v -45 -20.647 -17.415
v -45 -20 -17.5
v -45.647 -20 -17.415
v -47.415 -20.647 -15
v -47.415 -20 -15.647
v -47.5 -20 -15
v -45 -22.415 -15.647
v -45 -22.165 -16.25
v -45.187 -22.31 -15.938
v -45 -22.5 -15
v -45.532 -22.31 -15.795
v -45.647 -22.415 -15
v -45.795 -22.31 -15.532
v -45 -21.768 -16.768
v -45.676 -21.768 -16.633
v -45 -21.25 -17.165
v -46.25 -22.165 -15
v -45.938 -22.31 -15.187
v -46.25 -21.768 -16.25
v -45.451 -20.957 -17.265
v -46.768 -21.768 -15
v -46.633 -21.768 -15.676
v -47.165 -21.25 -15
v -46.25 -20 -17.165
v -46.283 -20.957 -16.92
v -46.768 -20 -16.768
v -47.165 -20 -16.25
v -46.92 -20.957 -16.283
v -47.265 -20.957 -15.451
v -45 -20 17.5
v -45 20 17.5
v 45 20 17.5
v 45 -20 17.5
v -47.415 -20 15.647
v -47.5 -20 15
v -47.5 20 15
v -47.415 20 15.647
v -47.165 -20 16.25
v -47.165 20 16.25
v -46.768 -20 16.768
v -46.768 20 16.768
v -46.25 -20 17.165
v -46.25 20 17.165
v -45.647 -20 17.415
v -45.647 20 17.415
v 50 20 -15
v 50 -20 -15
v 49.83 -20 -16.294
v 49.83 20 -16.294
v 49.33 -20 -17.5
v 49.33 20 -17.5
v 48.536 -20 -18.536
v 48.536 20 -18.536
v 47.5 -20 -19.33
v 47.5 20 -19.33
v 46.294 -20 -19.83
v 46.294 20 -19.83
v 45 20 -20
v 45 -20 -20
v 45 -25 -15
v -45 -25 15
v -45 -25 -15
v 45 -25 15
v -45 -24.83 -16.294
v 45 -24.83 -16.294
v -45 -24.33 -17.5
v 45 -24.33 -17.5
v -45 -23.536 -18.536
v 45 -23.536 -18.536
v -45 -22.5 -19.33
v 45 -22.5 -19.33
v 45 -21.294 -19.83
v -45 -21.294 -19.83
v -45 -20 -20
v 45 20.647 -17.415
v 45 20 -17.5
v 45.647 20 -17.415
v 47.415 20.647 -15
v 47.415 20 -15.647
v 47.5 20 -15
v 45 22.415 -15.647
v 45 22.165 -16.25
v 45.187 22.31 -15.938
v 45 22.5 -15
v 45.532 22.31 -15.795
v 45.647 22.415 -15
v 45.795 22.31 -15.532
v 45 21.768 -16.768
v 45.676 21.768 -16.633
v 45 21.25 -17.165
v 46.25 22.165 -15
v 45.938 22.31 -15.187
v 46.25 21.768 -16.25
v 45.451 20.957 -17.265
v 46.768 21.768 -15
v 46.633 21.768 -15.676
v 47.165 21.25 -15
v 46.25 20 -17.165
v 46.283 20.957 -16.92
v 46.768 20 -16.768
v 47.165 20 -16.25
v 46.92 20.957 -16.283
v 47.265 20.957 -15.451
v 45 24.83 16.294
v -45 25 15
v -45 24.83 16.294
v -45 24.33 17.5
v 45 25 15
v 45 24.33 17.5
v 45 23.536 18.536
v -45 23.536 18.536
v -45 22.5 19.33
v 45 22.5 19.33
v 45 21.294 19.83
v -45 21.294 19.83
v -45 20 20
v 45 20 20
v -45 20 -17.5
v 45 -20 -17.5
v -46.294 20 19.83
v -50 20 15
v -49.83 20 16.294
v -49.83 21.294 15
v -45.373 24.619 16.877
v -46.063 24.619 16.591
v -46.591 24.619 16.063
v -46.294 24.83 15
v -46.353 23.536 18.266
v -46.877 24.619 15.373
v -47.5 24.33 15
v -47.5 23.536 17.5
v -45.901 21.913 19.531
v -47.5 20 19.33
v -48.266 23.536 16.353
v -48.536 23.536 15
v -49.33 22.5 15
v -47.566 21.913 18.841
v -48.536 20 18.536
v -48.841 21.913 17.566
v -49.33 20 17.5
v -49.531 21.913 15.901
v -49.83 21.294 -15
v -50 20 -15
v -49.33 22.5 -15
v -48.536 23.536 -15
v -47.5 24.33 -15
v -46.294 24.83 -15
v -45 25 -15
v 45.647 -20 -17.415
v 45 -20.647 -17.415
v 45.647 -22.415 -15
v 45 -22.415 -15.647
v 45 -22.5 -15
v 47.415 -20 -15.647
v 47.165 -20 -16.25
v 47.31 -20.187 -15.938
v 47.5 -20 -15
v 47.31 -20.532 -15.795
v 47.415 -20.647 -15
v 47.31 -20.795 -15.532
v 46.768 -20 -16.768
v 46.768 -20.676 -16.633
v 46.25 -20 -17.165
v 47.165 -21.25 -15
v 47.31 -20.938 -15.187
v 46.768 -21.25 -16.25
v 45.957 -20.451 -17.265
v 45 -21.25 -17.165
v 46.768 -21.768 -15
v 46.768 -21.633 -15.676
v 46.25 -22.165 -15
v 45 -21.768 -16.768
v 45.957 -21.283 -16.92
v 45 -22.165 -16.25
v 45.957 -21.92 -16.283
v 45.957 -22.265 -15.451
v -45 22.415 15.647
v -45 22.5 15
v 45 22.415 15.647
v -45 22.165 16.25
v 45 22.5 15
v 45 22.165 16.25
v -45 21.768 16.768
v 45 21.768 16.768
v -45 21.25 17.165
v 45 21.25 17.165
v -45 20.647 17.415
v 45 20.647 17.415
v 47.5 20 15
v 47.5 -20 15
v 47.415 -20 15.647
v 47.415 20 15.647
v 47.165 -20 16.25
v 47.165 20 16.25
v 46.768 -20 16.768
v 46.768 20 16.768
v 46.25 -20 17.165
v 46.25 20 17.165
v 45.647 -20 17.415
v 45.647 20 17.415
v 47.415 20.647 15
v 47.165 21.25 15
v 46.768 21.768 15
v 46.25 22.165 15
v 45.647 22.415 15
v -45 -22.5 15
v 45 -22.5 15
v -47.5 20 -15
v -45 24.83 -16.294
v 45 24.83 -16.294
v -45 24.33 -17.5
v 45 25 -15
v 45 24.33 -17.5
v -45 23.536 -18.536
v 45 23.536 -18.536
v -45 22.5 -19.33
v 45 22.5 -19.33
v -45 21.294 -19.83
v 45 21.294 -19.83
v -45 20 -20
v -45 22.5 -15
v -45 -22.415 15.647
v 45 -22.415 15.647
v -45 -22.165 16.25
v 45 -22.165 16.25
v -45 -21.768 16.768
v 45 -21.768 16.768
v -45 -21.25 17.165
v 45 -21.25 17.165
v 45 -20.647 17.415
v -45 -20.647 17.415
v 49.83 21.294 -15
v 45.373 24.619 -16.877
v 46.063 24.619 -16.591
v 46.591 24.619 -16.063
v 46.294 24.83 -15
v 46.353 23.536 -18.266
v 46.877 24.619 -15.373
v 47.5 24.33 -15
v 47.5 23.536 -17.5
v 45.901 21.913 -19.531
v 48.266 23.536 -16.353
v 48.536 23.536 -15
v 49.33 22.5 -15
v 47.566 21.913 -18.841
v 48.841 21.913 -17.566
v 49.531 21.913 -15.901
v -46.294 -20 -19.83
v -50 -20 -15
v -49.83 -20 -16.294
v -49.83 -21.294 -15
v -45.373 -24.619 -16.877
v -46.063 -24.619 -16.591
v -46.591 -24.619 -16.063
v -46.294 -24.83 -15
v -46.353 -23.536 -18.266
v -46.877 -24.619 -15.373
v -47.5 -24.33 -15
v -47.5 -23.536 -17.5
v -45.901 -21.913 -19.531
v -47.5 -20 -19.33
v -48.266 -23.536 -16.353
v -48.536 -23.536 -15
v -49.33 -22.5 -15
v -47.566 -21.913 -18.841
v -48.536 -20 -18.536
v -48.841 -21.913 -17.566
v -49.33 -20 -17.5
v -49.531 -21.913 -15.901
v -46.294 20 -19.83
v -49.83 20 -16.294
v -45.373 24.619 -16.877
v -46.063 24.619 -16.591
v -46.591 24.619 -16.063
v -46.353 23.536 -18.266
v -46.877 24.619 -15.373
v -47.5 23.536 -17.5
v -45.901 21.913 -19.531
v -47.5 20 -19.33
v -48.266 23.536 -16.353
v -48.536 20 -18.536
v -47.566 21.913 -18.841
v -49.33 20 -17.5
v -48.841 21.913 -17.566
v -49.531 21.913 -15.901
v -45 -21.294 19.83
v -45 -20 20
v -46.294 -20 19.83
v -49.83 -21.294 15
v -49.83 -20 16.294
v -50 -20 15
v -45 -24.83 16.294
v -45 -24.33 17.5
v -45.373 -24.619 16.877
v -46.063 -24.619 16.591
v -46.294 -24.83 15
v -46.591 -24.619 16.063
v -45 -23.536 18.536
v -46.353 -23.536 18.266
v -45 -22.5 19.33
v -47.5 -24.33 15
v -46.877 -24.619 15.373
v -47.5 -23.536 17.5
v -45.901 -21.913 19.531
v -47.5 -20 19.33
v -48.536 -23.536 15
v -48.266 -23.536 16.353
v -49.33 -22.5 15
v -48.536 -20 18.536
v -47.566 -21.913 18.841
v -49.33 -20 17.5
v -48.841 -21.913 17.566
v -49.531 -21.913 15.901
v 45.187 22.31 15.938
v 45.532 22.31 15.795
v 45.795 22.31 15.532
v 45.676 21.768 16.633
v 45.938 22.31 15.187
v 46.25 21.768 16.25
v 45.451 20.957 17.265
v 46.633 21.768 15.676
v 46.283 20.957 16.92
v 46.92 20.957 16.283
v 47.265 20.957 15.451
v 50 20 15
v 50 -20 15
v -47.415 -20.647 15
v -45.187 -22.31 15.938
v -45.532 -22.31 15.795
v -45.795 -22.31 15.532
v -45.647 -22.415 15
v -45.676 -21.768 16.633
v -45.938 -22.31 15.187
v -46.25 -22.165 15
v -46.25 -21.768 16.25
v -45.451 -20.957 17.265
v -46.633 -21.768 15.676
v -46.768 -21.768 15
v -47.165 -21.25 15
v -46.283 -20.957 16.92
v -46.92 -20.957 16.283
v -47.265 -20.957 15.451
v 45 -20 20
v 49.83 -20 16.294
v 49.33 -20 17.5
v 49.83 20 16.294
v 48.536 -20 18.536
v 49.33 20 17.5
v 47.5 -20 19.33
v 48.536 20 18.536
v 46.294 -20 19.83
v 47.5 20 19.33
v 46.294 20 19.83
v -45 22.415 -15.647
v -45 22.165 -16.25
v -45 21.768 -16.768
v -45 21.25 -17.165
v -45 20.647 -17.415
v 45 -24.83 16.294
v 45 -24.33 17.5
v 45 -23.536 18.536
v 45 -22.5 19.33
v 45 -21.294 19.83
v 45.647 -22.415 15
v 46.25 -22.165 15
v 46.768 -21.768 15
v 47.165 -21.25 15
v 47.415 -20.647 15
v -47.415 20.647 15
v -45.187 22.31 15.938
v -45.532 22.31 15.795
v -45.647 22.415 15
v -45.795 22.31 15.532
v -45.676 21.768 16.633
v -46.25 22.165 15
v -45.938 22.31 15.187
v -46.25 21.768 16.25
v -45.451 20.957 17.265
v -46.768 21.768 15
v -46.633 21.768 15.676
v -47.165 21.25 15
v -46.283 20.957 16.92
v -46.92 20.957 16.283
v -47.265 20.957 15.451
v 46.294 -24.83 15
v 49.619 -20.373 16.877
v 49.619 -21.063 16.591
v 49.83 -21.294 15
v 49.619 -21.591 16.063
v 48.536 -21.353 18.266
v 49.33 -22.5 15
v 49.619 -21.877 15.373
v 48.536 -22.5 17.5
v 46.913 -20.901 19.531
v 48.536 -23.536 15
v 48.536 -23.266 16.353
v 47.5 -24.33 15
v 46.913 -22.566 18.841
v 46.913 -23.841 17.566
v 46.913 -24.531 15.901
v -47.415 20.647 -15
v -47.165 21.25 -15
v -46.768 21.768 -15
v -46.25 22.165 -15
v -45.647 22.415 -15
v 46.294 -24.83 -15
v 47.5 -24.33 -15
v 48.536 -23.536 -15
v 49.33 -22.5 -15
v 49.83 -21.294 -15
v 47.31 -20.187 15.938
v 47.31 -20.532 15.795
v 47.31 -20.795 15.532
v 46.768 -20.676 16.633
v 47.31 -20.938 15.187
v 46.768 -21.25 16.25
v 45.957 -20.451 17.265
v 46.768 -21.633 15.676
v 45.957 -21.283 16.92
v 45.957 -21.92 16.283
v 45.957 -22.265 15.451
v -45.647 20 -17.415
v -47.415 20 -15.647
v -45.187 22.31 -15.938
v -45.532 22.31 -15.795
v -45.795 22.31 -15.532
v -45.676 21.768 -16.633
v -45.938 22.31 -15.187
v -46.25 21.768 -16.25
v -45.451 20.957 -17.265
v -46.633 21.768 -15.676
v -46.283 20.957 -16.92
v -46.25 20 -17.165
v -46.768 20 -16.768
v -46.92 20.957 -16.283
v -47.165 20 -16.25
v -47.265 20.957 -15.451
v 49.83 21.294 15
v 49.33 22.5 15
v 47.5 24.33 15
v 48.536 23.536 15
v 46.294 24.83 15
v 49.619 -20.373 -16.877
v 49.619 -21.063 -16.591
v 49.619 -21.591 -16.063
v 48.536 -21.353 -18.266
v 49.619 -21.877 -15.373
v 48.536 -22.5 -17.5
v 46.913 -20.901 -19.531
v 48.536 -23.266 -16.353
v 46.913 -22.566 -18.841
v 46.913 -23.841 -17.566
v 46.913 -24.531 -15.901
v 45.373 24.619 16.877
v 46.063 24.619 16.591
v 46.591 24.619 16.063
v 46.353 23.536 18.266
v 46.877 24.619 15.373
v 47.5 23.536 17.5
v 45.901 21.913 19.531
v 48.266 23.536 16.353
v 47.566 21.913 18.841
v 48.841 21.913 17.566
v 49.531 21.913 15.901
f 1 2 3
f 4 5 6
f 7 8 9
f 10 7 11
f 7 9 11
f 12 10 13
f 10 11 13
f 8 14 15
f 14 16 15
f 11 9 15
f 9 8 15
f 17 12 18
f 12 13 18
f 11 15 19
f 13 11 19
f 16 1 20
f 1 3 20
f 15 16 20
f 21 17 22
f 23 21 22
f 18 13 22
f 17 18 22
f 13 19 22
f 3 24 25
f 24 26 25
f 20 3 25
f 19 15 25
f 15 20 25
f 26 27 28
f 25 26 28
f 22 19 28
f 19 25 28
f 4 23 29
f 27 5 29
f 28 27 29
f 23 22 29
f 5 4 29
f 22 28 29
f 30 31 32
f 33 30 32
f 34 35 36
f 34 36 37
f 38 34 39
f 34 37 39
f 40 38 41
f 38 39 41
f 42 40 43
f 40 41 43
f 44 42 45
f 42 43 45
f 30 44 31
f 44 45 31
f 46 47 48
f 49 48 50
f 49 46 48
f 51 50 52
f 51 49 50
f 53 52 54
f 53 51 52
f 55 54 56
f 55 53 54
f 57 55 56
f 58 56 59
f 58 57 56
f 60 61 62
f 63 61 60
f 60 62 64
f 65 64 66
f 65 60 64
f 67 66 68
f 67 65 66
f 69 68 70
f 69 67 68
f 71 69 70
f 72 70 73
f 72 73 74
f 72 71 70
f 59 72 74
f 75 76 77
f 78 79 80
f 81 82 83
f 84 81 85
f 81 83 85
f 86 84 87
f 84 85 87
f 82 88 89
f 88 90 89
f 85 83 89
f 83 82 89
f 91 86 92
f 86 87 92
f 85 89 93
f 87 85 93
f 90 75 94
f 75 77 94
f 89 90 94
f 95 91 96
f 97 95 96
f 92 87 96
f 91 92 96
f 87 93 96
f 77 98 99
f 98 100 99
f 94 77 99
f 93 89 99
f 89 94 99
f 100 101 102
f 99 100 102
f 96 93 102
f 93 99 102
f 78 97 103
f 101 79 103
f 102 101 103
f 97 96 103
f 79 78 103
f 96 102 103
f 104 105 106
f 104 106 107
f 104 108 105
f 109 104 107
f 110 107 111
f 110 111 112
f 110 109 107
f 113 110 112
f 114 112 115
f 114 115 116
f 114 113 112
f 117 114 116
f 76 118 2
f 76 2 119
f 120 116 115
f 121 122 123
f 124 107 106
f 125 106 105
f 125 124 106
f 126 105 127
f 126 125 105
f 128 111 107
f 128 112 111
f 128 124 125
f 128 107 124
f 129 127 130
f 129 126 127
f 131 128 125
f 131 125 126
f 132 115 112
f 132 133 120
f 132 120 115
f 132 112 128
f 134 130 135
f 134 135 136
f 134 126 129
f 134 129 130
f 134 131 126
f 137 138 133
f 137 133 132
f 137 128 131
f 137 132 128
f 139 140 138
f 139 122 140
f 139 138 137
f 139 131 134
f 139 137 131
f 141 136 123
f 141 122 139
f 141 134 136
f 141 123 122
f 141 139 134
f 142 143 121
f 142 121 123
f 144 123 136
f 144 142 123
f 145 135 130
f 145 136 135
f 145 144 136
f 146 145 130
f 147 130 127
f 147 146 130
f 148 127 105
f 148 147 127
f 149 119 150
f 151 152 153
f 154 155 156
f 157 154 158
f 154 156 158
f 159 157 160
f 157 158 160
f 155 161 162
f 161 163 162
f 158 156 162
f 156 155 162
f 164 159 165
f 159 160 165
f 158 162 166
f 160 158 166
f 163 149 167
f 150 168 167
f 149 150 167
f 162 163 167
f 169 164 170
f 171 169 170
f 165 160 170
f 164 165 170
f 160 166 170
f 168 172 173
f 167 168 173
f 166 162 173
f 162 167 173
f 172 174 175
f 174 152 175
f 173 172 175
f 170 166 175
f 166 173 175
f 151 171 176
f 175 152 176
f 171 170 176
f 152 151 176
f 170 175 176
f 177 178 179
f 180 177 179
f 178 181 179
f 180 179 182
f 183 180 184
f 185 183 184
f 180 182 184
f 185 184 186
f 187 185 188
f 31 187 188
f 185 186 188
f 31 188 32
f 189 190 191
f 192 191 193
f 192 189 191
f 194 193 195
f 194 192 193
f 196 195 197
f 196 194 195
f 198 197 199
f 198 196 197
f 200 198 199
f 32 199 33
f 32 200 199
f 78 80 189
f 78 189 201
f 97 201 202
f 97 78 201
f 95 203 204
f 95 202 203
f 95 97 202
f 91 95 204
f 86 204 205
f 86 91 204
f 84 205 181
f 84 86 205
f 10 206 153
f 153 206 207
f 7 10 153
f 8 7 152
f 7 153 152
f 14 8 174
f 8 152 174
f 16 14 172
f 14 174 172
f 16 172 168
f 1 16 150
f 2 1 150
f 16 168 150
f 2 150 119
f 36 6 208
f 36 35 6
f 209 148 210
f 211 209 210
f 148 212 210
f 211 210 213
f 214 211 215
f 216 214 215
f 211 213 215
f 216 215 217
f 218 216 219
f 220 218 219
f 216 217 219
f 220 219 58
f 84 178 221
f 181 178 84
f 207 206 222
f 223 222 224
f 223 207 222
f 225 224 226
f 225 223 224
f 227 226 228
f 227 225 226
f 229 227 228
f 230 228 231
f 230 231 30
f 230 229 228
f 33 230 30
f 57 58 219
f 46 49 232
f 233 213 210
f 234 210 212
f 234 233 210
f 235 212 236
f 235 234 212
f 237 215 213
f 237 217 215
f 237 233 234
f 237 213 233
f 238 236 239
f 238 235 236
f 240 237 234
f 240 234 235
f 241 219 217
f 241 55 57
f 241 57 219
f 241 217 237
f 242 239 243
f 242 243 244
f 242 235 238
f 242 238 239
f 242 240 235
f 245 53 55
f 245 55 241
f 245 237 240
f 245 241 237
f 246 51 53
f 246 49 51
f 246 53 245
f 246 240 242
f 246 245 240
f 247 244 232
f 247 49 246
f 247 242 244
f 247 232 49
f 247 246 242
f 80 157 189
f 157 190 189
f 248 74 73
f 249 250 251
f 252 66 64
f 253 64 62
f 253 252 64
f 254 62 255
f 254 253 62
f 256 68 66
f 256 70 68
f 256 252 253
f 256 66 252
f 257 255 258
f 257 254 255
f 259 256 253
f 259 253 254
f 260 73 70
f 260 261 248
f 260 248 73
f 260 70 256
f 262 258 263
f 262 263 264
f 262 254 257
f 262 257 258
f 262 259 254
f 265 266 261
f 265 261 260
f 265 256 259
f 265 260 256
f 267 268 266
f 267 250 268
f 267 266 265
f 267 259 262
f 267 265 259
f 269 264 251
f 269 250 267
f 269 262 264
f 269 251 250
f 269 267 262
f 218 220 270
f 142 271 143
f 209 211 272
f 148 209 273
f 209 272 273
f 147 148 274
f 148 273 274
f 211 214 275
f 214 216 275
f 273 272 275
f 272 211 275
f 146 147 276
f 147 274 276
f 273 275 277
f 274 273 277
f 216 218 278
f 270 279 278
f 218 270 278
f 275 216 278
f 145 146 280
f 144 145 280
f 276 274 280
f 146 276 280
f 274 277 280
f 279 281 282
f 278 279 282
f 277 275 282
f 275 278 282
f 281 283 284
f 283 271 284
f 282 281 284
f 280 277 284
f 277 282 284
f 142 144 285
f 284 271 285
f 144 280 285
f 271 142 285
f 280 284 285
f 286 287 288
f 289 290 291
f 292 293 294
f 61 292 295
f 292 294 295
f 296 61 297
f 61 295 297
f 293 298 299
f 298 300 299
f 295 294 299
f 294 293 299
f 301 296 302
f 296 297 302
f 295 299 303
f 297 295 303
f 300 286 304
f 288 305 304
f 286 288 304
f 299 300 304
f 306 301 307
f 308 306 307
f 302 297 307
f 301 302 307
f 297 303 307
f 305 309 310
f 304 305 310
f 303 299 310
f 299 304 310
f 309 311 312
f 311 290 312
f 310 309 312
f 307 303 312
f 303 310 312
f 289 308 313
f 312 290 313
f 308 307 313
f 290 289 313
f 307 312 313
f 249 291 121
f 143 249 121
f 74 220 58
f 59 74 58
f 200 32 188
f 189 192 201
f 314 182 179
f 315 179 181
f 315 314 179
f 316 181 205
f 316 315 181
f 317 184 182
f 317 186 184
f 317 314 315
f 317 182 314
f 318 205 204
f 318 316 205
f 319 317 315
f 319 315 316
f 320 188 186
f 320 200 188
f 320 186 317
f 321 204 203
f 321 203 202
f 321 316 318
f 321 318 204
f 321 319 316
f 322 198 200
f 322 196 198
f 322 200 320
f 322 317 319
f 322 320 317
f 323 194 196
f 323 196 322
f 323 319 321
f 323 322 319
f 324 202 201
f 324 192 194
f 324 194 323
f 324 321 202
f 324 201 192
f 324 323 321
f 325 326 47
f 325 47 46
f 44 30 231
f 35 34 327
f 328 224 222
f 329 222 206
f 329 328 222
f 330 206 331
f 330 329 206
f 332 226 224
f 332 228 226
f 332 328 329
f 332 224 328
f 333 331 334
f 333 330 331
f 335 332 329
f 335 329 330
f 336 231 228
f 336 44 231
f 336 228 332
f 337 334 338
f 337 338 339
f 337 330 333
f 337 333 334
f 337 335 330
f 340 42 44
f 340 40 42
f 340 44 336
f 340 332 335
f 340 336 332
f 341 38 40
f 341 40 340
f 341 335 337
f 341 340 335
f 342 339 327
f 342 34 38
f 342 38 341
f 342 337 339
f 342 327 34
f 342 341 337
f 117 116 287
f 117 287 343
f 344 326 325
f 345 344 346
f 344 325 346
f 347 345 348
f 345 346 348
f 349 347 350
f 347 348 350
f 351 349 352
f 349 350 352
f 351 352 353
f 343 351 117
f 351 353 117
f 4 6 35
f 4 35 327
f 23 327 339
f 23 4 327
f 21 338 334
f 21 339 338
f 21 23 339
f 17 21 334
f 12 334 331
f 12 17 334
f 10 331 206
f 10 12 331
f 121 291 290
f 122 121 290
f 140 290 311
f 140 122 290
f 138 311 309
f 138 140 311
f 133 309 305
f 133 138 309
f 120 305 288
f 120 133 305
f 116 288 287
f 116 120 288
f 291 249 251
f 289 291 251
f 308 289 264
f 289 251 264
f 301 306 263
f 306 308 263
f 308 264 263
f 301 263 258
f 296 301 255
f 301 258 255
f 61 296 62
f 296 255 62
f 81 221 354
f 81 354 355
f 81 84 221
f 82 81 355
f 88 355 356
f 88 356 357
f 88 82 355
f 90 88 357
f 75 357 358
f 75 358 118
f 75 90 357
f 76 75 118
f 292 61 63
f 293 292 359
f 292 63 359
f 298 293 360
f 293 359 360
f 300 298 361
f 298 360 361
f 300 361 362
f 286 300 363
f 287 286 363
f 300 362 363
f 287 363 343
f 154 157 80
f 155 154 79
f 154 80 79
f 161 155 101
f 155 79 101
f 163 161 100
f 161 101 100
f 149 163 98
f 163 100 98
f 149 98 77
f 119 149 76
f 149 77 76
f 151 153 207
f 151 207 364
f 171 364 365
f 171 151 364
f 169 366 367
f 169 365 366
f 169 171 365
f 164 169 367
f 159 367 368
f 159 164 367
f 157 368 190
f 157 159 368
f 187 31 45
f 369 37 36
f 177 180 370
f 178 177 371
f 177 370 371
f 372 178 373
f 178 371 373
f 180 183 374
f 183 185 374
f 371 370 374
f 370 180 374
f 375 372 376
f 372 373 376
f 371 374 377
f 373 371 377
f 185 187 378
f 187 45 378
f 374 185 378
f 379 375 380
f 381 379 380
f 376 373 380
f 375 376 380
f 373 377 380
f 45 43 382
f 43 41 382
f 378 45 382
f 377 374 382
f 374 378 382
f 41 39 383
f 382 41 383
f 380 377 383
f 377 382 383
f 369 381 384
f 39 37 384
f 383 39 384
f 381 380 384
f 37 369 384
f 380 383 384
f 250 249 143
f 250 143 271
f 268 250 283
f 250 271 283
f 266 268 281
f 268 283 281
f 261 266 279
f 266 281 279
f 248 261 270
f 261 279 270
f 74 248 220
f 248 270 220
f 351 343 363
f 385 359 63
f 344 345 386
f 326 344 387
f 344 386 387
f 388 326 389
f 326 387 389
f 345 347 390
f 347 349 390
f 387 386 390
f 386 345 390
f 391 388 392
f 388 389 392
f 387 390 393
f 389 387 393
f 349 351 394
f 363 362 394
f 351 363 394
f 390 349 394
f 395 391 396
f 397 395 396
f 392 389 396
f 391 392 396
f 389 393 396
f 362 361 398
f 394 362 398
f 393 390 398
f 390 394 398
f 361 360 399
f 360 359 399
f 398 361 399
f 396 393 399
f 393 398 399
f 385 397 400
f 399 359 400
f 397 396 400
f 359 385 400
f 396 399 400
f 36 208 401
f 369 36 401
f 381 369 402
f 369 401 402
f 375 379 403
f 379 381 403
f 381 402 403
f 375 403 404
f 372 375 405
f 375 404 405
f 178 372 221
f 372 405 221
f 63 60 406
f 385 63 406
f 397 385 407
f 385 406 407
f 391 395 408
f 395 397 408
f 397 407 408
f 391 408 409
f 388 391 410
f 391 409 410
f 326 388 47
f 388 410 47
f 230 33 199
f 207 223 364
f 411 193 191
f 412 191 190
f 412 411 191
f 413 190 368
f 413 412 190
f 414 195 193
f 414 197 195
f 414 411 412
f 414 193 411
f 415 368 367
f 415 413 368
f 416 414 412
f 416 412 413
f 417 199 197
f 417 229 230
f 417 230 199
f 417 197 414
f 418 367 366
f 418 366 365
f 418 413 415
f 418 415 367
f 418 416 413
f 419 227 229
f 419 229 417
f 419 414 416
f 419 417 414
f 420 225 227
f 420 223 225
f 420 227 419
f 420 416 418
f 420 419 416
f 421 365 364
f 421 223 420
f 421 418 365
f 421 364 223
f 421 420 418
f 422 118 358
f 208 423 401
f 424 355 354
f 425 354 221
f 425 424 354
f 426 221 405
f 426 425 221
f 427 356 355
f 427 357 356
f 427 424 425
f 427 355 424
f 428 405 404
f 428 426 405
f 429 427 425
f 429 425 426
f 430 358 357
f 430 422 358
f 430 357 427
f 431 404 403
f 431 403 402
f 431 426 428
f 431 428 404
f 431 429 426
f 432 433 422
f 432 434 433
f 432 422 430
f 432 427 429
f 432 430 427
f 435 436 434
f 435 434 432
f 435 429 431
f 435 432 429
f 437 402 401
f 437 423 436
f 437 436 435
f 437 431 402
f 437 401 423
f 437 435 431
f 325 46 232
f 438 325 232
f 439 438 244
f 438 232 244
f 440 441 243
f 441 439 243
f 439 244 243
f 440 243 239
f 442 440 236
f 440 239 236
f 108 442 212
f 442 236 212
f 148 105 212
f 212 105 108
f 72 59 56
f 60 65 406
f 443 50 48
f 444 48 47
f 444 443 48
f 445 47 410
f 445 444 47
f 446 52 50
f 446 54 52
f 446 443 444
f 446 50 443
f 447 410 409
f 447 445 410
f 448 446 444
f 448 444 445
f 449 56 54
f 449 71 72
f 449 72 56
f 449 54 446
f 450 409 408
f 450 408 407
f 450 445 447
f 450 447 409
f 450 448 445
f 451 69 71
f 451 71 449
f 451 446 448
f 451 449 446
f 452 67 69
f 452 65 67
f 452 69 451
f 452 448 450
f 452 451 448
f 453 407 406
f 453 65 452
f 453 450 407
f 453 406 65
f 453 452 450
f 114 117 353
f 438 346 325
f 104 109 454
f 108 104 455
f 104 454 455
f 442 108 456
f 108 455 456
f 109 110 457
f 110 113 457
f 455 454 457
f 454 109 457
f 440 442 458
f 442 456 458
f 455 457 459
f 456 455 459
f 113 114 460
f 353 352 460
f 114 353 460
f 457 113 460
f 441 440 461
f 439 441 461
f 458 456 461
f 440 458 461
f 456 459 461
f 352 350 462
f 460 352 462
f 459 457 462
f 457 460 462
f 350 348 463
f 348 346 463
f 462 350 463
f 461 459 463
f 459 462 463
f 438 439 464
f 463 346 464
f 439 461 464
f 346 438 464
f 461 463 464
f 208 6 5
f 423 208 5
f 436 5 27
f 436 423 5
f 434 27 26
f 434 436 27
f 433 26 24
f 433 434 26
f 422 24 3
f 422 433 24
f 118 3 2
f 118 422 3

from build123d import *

# Parameters (mm, degrees)
F0_W     = 100
F0_H     = 50
F1_DEPTH = 20
F2_R     = 5
F3_T     = -2.5


with BuildPart() as f1:
    # F0 (on Top) → F1 (new body)
    with BuildSketch(Plane.XY):
        Rectangle(F0_W, F0_H)
    extrude(amount=F1_DEPTH)

    # F2
    f2_edges = [f1.edges().sort_by_distance(p)[0] for p in [
        (-50, 0, 20),
        (0, -25, 20),
        (50, 0, 20),
        (0, 25, 20),
        (50, 25, 10),
        (50, -25, 10),
        (-50, -25, 10),
        (-50, 25, 10),
    ]]
    fillet(f2_edges, radius=F2_R)

    # F3
    f3_openings = [f1.faces().sort_by_distance(p)[0] for p in [
        (0, 0, 0),
    ]]
    offset(amount=F3_T, openings=f3_openings)

    # F4: F1 across plane


with BuildPart() as f1_1:
    add(f1.part)
    add(f1.part.mirror(Plane.XY))


solid = f1_1.part
